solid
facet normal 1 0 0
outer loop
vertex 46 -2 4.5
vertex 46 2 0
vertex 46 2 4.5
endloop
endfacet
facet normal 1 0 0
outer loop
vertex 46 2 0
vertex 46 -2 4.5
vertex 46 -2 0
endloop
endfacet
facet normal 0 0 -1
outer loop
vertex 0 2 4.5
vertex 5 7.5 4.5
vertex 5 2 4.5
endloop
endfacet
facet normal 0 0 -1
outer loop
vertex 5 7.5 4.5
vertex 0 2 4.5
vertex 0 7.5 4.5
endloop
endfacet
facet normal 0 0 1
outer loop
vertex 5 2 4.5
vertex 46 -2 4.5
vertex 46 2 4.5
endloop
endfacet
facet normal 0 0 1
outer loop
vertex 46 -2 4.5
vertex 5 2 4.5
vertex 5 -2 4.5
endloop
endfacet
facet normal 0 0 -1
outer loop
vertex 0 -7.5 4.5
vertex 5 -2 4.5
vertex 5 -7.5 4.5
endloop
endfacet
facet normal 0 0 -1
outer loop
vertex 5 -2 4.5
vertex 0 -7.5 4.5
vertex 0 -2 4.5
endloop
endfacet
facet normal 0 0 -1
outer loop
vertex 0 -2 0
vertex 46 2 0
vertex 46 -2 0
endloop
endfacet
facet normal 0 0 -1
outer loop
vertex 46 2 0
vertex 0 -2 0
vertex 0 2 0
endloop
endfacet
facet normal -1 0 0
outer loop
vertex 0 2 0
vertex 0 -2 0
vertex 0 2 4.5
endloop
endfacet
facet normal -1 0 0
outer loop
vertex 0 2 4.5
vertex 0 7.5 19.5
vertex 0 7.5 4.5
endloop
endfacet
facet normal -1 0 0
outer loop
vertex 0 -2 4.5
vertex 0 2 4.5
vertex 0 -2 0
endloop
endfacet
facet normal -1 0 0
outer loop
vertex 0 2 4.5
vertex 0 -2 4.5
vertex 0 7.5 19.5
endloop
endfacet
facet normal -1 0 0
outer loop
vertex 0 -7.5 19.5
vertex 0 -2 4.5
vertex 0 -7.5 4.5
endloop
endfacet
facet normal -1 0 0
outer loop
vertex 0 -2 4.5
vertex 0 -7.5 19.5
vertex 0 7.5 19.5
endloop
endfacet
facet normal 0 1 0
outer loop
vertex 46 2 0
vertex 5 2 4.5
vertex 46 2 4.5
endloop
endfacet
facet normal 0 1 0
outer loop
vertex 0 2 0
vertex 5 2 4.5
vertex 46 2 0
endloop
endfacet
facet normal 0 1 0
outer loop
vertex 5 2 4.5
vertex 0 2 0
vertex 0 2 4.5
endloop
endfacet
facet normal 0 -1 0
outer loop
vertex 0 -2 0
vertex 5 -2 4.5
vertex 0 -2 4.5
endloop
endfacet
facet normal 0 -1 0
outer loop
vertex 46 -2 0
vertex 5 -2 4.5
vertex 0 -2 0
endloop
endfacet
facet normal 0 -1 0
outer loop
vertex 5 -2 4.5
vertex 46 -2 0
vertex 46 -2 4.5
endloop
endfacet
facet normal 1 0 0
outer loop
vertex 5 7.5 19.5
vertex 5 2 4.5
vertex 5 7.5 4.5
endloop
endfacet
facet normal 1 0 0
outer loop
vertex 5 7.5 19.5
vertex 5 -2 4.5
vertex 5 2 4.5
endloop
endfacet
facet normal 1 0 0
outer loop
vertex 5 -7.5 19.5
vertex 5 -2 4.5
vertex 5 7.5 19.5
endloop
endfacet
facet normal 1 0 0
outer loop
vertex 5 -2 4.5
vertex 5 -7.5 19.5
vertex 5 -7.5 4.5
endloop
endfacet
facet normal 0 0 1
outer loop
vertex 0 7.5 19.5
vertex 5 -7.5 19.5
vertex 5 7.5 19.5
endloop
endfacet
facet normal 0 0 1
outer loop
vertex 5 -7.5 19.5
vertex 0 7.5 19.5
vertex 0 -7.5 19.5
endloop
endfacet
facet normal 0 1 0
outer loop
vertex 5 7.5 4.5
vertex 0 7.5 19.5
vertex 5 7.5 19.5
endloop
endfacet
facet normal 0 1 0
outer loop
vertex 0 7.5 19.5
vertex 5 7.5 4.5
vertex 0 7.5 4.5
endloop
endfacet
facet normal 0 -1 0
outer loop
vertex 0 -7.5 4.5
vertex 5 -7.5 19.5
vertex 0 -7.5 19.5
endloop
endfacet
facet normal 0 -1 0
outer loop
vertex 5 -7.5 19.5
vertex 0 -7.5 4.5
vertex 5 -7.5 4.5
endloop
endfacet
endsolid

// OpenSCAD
// file: Library/center.scad
module center(axis){
	translate((axis / -2.0)){
		children();
	}
}
// file: CylinderDispenser_Ejector_Paddle.scad
use <Library/center.scad>
//Length, width, height. Length is the thiccness of the paddle.
dimensions = [5, 15, 15];

module CylinderDispenser_Ejector_Paddle(dimensions){
	center([0, dimensions.y, 0]){
		cube(dimensions);
	}
}

CylinderDispenser_Ejector_Paddle(dimensions);
// file: CylinderDispenser_Ejector_Rod.scad
use <Library/center.scad>

//This rod is positive space for the full ejector rod, and negative space that gets cut out of the dispenser.

//Length, width, and height of rod. Length should include the thiccness of the paddle.
dimensions = [30+2+30, 5, 5];

module CylinderDispenser_Ejector_Rod(dimensions){
	center([0, dimensions.y, 0]){
		cube(dimensions);
	}
}

CylinderDispenser_Ejector_Rod(dimensions);
// main file
use <CylinderDispenser_Ejector_Rod.scad>
use <CylinderDispenser_Ejector_Paddle.scad>

//Length, width, height of the rod. Rod length includes the paddle length.
rodDimensions = [46, 4.0, 4.5];

//Length, width, height of the paddle. Length is the thiccness of the paddle.
paddleDimensions = [5, 15, 15];

module CylinderDispenser_Ejector(rodDimensions, paddleDimensions){
	union(){
		CylinderDispenser_Ejector_Rod(rodDimensions);
		translate([0, 0, rodDimensions.z])
		CylinderDispenser_Ejector_Paddle(paddleDimensions);
	}
}

CylinderDispenser_Ejector(rodDimensions, paddleDimensions);
